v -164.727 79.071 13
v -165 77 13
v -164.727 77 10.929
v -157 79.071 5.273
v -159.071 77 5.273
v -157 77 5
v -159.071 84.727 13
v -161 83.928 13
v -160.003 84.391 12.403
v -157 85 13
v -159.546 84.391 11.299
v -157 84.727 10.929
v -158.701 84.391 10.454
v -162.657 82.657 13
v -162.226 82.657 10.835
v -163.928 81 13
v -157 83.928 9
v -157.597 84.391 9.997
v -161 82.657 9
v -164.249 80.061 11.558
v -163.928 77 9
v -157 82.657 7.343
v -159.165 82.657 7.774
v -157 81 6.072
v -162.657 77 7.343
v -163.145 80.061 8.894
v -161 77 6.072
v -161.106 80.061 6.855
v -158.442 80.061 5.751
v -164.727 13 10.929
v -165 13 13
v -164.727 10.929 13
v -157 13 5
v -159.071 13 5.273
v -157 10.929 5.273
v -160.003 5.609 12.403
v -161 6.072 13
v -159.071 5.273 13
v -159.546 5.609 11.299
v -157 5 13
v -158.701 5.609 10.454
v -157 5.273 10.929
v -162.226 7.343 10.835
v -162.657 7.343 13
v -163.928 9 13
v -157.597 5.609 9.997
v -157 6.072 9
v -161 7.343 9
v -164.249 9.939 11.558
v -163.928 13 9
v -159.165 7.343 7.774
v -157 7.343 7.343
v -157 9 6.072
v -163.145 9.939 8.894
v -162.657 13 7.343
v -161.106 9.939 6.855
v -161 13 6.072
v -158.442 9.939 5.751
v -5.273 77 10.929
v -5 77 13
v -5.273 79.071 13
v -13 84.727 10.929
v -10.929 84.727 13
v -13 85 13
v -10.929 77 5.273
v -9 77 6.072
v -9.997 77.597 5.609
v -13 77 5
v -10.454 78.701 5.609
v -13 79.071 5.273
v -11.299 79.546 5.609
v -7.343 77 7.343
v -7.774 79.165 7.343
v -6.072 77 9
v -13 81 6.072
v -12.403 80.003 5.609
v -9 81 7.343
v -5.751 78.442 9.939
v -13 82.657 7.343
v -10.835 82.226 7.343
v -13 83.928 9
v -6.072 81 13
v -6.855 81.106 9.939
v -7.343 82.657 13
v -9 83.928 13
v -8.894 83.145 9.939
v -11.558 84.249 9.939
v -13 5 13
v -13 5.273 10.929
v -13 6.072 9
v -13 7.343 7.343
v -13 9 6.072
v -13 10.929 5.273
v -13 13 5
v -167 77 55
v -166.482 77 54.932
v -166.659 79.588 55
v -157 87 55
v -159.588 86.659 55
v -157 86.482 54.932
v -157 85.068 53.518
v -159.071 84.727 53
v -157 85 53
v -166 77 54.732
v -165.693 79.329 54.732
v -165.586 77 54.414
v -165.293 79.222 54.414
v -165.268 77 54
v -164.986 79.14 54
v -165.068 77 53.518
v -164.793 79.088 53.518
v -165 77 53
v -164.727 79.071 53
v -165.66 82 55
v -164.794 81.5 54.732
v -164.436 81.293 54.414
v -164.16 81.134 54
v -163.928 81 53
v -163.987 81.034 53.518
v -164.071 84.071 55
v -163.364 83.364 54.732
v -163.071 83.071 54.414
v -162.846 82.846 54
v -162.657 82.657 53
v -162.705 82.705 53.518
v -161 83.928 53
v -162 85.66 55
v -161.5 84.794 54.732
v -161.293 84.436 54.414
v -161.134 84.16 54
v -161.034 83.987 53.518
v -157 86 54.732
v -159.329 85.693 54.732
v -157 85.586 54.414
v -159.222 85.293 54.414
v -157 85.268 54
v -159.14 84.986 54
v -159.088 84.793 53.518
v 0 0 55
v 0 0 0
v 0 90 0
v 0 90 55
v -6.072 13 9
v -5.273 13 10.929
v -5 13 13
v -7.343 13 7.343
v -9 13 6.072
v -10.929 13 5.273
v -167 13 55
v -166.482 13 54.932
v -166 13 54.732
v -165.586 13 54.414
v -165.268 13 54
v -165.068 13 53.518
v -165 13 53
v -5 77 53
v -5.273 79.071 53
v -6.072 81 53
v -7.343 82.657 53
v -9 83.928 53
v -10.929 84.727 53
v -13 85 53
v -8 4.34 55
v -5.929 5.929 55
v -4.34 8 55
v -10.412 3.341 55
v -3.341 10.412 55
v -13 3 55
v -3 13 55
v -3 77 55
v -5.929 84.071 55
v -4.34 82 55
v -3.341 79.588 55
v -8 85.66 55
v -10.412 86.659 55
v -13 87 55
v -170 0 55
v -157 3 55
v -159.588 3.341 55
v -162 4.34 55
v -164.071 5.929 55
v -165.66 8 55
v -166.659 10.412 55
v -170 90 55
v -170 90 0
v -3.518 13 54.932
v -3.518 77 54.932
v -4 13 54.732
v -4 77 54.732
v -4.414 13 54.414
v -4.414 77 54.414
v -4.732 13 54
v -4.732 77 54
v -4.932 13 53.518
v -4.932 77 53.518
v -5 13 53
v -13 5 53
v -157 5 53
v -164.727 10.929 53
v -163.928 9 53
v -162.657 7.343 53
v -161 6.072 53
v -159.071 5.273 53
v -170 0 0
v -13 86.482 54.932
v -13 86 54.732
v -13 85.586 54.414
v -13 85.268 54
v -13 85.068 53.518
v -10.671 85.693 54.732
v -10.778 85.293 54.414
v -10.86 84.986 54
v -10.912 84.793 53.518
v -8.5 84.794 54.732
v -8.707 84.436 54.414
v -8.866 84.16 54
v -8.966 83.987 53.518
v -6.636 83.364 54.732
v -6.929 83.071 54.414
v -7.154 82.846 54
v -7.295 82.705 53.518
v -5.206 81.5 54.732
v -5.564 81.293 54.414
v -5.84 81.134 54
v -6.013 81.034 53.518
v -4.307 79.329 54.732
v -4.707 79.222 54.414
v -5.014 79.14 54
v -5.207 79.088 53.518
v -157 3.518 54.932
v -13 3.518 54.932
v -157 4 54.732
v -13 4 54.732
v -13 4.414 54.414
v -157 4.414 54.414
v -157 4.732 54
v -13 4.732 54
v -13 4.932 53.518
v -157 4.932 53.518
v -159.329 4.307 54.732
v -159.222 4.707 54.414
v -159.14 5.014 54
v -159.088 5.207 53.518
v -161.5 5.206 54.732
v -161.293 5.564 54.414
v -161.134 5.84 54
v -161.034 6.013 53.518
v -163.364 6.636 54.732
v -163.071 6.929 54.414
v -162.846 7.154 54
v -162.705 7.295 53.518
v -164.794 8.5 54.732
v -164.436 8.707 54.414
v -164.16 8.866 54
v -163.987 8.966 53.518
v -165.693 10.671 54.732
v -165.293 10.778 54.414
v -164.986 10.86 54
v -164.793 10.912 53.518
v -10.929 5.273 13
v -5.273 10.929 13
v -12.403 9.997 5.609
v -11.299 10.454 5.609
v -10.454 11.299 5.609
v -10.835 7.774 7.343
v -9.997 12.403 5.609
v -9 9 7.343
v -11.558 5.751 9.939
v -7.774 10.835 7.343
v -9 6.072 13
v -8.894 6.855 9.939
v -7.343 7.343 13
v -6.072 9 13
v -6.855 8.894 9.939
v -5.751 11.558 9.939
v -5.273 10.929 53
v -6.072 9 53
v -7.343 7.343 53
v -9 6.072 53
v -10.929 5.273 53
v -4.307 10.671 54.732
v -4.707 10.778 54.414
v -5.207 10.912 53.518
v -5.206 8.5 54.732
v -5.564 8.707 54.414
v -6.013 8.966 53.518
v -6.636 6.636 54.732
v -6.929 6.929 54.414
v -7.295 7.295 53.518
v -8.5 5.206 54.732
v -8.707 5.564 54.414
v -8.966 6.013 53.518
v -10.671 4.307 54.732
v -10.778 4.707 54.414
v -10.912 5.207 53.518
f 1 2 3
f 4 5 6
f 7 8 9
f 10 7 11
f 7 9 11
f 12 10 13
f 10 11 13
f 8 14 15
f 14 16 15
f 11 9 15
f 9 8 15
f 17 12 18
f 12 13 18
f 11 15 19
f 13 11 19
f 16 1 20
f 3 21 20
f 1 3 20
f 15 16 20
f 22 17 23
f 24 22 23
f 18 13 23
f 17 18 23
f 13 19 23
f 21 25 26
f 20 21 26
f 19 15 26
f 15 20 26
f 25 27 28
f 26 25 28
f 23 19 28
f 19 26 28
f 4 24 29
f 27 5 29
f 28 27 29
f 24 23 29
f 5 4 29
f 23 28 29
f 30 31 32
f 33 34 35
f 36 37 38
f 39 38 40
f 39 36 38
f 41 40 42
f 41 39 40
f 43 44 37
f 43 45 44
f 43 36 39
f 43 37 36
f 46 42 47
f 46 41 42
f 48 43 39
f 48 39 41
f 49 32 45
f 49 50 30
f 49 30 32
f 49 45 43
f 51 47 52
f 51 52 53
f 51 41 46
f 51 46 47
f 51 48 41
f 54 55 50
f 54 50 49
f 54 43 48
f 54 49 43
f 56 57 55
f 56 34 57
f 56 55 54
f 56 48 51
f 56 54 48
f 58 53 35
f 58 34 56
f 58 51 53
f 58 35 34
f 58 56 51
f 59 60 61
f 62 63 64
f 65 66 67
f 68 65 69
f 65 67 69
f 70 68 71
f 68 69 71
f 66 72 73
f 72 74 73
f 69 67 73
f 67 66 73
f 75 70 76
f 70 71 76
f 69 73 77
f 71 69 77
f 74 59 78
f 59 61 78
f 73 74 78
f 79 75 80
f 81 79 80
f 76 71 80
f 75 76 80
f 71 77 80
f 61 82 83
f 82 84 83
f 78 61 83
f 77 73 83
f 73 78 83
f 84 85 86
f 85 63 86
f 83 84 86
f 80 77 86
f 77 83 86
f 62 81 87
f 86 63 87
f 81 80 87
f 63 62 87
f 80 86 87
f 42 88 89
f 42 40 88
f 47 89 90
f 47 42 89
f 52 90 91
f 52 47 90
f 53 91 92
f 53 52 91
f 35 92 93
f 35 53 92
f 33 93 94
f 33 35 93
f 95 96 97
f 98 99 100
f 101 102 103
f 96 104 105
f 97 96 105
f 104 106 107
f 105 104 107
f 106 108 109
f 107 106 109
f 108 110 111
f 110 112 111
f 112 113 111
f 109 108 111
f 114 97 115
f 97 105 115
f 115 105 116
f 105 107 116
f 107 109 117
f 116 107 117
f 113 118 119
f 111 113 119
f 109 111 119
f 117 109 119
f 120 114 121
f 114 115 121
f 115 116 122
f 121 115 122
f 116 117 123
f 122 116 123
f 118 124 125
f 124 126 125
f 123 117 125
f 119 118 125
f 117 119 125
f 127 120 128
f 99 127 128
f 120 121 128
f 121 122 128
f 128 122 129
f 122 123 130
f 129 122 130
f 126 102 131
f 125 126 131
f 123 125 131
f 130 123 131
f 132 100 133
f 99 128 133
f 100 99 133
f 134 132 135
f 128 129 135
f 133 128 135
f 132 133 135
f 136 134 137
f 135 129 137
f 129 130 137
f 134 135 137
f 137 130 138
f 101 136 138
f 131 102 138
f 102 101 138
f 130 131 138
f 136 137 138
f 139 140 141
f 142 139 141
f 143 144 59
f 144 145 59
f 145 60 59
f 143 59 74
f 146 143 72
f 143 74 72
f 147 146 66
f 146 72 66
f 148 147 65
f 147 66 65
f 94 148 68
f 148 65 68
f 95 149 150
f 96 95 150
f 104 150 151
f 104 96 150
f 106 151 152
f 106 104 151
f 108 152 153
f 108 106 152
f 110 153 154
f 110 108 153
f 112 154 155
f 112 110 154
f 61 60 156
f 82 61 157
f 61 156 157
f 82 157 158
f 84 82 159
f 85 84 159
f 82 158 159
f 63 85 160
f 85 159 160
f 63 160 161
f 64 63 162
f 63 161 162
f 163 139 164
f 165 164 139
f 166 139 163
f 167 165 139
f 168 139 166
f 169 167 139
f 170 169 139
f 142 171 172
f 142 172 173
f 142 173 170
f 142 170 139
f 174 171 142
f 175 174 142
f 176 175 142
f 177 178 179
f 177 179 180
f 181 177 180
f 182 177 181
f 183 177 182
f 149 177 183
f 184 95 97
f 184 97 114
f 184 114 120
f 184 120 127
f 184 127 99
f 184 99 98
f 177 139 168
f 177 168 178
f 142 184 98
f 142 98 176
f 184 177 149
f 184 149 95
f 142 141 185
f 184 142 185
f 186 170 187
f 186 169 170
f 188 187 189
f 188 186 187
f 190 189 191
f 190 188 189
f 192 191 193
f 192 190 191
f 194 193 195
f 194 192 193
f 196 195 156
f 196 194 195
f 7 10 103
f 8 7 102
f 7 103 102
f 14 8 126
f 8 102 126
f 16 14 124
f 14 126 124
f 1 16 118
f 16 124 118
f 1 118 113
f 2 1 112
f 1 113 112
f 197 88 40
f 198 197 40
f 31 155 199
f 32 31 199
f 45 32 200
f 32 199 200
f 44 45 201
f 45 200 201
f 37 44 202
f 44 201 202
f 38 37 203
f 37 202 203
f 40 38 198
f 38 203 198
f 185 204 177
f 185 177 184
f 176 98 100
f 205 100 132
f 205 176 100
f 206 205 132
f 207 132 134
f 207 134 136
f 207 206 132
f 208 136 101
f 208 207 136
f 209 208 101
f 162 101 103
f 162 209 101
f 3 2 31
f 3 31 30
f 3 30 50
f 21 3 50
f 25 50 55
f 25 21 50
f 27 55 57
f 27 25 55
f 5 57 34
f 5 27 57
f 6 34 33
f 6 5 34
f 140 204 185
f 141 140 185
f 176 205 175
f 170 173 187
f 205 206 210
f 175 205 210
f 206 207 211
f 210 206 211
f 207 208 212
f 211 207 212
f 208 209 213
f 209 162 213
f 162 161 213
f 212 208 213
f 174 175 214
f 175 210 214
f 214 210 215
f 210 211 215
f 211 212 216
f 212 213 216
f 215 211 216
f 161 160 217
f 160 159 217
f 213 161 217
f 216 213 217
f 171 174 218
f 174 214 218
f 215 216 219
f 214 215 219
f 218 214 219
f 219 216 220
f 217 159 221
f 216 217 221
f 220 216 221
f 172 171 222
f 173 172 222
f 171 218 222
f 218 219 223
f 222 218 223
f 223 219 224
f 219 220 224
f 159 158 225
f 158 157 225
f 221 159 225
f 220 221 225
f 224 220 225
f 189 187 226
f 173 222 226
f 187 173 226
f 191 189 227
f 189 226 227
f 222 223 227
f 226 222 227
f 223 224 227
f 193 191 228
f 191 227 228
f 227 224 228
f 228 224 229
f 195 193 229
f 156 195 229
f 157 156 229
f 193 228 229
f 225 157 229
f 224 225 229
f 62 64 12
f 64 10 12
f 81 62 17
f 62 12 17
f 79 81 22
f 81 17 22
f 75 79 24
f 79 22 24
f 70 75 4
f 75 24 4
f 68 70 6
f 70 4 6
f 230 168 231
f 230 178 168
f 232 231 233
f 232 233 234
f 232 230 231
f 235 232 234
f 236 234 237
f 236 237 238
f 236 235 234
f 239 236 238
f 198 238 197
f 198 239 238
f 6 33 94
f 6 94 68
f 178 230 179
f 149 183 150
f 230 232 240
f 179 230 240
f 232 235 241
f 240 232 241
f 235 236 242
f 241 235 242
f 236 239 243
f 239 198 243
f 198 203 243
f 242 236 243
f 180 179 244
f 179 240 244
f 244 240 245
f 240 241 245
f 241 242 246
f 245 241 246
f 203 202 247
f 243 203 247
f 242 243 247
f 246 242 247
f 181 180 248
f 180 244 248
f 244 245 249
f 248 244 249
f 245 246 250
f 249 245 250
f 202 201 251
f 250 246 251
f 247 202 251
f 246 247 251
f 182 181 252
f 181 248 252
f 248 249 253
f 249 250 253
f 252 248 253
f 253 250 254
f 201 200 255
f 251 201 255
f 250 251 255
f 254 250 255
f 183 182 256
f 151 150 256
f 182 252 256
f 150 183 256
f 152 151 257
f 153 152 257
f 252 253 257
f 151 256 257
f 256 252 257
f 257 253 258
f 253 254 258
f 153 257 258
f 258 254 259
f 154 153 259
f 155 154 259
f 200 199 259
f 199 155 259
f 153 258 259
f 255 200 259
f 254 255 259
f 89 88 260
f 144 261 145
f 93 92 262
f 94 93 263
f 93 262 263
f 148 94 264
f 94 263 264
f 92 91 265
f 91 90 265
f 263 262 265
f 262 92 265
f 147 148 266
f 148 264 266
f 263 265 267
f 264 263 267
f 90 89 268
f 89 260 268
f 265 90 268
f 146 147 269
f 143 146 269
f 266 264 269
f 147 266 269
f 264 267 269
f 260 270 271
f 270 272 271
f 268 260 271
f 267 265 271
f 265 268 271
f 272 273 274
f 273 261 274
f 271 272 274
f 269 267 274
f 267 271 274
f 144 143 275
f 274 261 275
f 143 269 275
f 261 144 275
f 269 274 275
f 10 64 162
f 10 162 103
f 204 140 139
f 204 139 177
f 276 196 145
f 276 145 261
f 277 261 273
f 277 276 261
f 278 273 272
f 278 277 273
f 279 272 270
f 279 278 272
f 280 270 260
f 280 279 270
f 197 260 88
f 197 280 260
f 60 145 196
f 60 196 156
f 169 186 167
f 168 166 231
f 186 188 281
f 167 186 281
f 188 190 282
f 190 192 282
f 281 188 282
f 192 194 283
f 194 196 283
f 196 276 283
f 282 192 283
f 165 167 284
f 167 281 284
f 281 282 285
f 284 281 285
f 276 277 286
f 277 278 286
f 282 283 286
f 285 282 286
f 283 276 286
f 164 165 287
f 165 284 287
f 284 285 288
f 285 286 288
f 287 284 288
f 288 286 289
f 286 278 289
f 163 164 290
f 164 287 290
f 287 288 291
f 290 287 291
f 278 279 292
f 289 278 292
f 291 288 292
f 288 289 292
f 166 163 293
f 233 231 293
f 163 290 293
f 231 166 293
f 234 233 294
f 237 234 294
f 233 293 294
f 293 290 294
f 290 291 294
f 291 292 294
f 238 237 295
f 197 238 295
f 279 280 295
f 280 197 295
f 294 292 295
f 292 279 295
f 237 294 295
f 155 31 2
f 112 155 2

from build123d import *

# Parameters (mm, degrees)
IZIM1_W                     = 80
IZIM1_H                     = 160
Y_KSEKLIK_EKSTR_ZYON1_DEPTH = 5
IZIM1_3_W                   = 90
IZIM1_3_H                   = 170
IZIM1_3_W_2                 = 80
IZIM1_3_H_2                 = 160
Y_KSEKLIK_EKSTR_ZYON2_DEPTH = 55
RADYUS2_R                   = 8
RADYUS4_R                   = 2


with BuildPart() as part:
    # Çizim1 → Yükseklik-Ekstrüzyon1 (new body)
    with BuildSketch(Plane(origin=(0, 0, 0), x_dir=(0, 1, 0), z_dir=(0, 0, 1))):
        with Locations((45, 85)):
            Rectangle(IZIM1_W, IZIM1_H)
    extrude(amount=Y_KSEKLIK_EKSTR_ZYON1_DEPTH)

    # Çizim1<3> → Yükseklik-Ekstrüzyon2 (add)
    with BuildSketch(Plane(origin=(0, 0, 0), x_dir=(0, 1, 0), z_dir=(0, 0, 1))):
        with Locations((45, 85)):
            Rectangle(IZIM1_3_W, IZIM1_3_H)
        with Locations((45, 85)):
            Rectangle(IZIM1_3_W_2, IZIM1_3_H_2, mode=Mode.SUBTRACT)
    extrude(amount=Y_KSEKLIK_EKSTR_ZYON2_DEPTH)

    # Radyus2
    radyus2_edges = [part.edges().sort_by_distance(p)[0] for p in [
        (-165, 45, 5),
        (-5, 85, 30),
        (-165, 85, 30),
        (-165, 5, 30),
        (-5, 5, 30),
        (-85, 5, 5),
        (-5, 45, 5),
        (-85, 85, 5),
    ]]
    fillet(radyus2_edges, radius=RADYUS2_R)

    # Radyus4
    radyus4_edges = [part.edges().sort_by_distance(p)[0] for p in [
        (-85, 5, 55),
        (-5, 45, 55),
        (-85, 85, 55),
        (-165, 45, 55),
        (-7.343145751, 7.343145751, 55),
        (-7.343145751, 82.656854249, 55),
        (-162.656854249, 82.656854249, 55),
        (-162.656854249, 7.343145751, 55),
    ]]
    fillet(radyus4_edges, radius=RADYUS4_R)


solid = part.part
